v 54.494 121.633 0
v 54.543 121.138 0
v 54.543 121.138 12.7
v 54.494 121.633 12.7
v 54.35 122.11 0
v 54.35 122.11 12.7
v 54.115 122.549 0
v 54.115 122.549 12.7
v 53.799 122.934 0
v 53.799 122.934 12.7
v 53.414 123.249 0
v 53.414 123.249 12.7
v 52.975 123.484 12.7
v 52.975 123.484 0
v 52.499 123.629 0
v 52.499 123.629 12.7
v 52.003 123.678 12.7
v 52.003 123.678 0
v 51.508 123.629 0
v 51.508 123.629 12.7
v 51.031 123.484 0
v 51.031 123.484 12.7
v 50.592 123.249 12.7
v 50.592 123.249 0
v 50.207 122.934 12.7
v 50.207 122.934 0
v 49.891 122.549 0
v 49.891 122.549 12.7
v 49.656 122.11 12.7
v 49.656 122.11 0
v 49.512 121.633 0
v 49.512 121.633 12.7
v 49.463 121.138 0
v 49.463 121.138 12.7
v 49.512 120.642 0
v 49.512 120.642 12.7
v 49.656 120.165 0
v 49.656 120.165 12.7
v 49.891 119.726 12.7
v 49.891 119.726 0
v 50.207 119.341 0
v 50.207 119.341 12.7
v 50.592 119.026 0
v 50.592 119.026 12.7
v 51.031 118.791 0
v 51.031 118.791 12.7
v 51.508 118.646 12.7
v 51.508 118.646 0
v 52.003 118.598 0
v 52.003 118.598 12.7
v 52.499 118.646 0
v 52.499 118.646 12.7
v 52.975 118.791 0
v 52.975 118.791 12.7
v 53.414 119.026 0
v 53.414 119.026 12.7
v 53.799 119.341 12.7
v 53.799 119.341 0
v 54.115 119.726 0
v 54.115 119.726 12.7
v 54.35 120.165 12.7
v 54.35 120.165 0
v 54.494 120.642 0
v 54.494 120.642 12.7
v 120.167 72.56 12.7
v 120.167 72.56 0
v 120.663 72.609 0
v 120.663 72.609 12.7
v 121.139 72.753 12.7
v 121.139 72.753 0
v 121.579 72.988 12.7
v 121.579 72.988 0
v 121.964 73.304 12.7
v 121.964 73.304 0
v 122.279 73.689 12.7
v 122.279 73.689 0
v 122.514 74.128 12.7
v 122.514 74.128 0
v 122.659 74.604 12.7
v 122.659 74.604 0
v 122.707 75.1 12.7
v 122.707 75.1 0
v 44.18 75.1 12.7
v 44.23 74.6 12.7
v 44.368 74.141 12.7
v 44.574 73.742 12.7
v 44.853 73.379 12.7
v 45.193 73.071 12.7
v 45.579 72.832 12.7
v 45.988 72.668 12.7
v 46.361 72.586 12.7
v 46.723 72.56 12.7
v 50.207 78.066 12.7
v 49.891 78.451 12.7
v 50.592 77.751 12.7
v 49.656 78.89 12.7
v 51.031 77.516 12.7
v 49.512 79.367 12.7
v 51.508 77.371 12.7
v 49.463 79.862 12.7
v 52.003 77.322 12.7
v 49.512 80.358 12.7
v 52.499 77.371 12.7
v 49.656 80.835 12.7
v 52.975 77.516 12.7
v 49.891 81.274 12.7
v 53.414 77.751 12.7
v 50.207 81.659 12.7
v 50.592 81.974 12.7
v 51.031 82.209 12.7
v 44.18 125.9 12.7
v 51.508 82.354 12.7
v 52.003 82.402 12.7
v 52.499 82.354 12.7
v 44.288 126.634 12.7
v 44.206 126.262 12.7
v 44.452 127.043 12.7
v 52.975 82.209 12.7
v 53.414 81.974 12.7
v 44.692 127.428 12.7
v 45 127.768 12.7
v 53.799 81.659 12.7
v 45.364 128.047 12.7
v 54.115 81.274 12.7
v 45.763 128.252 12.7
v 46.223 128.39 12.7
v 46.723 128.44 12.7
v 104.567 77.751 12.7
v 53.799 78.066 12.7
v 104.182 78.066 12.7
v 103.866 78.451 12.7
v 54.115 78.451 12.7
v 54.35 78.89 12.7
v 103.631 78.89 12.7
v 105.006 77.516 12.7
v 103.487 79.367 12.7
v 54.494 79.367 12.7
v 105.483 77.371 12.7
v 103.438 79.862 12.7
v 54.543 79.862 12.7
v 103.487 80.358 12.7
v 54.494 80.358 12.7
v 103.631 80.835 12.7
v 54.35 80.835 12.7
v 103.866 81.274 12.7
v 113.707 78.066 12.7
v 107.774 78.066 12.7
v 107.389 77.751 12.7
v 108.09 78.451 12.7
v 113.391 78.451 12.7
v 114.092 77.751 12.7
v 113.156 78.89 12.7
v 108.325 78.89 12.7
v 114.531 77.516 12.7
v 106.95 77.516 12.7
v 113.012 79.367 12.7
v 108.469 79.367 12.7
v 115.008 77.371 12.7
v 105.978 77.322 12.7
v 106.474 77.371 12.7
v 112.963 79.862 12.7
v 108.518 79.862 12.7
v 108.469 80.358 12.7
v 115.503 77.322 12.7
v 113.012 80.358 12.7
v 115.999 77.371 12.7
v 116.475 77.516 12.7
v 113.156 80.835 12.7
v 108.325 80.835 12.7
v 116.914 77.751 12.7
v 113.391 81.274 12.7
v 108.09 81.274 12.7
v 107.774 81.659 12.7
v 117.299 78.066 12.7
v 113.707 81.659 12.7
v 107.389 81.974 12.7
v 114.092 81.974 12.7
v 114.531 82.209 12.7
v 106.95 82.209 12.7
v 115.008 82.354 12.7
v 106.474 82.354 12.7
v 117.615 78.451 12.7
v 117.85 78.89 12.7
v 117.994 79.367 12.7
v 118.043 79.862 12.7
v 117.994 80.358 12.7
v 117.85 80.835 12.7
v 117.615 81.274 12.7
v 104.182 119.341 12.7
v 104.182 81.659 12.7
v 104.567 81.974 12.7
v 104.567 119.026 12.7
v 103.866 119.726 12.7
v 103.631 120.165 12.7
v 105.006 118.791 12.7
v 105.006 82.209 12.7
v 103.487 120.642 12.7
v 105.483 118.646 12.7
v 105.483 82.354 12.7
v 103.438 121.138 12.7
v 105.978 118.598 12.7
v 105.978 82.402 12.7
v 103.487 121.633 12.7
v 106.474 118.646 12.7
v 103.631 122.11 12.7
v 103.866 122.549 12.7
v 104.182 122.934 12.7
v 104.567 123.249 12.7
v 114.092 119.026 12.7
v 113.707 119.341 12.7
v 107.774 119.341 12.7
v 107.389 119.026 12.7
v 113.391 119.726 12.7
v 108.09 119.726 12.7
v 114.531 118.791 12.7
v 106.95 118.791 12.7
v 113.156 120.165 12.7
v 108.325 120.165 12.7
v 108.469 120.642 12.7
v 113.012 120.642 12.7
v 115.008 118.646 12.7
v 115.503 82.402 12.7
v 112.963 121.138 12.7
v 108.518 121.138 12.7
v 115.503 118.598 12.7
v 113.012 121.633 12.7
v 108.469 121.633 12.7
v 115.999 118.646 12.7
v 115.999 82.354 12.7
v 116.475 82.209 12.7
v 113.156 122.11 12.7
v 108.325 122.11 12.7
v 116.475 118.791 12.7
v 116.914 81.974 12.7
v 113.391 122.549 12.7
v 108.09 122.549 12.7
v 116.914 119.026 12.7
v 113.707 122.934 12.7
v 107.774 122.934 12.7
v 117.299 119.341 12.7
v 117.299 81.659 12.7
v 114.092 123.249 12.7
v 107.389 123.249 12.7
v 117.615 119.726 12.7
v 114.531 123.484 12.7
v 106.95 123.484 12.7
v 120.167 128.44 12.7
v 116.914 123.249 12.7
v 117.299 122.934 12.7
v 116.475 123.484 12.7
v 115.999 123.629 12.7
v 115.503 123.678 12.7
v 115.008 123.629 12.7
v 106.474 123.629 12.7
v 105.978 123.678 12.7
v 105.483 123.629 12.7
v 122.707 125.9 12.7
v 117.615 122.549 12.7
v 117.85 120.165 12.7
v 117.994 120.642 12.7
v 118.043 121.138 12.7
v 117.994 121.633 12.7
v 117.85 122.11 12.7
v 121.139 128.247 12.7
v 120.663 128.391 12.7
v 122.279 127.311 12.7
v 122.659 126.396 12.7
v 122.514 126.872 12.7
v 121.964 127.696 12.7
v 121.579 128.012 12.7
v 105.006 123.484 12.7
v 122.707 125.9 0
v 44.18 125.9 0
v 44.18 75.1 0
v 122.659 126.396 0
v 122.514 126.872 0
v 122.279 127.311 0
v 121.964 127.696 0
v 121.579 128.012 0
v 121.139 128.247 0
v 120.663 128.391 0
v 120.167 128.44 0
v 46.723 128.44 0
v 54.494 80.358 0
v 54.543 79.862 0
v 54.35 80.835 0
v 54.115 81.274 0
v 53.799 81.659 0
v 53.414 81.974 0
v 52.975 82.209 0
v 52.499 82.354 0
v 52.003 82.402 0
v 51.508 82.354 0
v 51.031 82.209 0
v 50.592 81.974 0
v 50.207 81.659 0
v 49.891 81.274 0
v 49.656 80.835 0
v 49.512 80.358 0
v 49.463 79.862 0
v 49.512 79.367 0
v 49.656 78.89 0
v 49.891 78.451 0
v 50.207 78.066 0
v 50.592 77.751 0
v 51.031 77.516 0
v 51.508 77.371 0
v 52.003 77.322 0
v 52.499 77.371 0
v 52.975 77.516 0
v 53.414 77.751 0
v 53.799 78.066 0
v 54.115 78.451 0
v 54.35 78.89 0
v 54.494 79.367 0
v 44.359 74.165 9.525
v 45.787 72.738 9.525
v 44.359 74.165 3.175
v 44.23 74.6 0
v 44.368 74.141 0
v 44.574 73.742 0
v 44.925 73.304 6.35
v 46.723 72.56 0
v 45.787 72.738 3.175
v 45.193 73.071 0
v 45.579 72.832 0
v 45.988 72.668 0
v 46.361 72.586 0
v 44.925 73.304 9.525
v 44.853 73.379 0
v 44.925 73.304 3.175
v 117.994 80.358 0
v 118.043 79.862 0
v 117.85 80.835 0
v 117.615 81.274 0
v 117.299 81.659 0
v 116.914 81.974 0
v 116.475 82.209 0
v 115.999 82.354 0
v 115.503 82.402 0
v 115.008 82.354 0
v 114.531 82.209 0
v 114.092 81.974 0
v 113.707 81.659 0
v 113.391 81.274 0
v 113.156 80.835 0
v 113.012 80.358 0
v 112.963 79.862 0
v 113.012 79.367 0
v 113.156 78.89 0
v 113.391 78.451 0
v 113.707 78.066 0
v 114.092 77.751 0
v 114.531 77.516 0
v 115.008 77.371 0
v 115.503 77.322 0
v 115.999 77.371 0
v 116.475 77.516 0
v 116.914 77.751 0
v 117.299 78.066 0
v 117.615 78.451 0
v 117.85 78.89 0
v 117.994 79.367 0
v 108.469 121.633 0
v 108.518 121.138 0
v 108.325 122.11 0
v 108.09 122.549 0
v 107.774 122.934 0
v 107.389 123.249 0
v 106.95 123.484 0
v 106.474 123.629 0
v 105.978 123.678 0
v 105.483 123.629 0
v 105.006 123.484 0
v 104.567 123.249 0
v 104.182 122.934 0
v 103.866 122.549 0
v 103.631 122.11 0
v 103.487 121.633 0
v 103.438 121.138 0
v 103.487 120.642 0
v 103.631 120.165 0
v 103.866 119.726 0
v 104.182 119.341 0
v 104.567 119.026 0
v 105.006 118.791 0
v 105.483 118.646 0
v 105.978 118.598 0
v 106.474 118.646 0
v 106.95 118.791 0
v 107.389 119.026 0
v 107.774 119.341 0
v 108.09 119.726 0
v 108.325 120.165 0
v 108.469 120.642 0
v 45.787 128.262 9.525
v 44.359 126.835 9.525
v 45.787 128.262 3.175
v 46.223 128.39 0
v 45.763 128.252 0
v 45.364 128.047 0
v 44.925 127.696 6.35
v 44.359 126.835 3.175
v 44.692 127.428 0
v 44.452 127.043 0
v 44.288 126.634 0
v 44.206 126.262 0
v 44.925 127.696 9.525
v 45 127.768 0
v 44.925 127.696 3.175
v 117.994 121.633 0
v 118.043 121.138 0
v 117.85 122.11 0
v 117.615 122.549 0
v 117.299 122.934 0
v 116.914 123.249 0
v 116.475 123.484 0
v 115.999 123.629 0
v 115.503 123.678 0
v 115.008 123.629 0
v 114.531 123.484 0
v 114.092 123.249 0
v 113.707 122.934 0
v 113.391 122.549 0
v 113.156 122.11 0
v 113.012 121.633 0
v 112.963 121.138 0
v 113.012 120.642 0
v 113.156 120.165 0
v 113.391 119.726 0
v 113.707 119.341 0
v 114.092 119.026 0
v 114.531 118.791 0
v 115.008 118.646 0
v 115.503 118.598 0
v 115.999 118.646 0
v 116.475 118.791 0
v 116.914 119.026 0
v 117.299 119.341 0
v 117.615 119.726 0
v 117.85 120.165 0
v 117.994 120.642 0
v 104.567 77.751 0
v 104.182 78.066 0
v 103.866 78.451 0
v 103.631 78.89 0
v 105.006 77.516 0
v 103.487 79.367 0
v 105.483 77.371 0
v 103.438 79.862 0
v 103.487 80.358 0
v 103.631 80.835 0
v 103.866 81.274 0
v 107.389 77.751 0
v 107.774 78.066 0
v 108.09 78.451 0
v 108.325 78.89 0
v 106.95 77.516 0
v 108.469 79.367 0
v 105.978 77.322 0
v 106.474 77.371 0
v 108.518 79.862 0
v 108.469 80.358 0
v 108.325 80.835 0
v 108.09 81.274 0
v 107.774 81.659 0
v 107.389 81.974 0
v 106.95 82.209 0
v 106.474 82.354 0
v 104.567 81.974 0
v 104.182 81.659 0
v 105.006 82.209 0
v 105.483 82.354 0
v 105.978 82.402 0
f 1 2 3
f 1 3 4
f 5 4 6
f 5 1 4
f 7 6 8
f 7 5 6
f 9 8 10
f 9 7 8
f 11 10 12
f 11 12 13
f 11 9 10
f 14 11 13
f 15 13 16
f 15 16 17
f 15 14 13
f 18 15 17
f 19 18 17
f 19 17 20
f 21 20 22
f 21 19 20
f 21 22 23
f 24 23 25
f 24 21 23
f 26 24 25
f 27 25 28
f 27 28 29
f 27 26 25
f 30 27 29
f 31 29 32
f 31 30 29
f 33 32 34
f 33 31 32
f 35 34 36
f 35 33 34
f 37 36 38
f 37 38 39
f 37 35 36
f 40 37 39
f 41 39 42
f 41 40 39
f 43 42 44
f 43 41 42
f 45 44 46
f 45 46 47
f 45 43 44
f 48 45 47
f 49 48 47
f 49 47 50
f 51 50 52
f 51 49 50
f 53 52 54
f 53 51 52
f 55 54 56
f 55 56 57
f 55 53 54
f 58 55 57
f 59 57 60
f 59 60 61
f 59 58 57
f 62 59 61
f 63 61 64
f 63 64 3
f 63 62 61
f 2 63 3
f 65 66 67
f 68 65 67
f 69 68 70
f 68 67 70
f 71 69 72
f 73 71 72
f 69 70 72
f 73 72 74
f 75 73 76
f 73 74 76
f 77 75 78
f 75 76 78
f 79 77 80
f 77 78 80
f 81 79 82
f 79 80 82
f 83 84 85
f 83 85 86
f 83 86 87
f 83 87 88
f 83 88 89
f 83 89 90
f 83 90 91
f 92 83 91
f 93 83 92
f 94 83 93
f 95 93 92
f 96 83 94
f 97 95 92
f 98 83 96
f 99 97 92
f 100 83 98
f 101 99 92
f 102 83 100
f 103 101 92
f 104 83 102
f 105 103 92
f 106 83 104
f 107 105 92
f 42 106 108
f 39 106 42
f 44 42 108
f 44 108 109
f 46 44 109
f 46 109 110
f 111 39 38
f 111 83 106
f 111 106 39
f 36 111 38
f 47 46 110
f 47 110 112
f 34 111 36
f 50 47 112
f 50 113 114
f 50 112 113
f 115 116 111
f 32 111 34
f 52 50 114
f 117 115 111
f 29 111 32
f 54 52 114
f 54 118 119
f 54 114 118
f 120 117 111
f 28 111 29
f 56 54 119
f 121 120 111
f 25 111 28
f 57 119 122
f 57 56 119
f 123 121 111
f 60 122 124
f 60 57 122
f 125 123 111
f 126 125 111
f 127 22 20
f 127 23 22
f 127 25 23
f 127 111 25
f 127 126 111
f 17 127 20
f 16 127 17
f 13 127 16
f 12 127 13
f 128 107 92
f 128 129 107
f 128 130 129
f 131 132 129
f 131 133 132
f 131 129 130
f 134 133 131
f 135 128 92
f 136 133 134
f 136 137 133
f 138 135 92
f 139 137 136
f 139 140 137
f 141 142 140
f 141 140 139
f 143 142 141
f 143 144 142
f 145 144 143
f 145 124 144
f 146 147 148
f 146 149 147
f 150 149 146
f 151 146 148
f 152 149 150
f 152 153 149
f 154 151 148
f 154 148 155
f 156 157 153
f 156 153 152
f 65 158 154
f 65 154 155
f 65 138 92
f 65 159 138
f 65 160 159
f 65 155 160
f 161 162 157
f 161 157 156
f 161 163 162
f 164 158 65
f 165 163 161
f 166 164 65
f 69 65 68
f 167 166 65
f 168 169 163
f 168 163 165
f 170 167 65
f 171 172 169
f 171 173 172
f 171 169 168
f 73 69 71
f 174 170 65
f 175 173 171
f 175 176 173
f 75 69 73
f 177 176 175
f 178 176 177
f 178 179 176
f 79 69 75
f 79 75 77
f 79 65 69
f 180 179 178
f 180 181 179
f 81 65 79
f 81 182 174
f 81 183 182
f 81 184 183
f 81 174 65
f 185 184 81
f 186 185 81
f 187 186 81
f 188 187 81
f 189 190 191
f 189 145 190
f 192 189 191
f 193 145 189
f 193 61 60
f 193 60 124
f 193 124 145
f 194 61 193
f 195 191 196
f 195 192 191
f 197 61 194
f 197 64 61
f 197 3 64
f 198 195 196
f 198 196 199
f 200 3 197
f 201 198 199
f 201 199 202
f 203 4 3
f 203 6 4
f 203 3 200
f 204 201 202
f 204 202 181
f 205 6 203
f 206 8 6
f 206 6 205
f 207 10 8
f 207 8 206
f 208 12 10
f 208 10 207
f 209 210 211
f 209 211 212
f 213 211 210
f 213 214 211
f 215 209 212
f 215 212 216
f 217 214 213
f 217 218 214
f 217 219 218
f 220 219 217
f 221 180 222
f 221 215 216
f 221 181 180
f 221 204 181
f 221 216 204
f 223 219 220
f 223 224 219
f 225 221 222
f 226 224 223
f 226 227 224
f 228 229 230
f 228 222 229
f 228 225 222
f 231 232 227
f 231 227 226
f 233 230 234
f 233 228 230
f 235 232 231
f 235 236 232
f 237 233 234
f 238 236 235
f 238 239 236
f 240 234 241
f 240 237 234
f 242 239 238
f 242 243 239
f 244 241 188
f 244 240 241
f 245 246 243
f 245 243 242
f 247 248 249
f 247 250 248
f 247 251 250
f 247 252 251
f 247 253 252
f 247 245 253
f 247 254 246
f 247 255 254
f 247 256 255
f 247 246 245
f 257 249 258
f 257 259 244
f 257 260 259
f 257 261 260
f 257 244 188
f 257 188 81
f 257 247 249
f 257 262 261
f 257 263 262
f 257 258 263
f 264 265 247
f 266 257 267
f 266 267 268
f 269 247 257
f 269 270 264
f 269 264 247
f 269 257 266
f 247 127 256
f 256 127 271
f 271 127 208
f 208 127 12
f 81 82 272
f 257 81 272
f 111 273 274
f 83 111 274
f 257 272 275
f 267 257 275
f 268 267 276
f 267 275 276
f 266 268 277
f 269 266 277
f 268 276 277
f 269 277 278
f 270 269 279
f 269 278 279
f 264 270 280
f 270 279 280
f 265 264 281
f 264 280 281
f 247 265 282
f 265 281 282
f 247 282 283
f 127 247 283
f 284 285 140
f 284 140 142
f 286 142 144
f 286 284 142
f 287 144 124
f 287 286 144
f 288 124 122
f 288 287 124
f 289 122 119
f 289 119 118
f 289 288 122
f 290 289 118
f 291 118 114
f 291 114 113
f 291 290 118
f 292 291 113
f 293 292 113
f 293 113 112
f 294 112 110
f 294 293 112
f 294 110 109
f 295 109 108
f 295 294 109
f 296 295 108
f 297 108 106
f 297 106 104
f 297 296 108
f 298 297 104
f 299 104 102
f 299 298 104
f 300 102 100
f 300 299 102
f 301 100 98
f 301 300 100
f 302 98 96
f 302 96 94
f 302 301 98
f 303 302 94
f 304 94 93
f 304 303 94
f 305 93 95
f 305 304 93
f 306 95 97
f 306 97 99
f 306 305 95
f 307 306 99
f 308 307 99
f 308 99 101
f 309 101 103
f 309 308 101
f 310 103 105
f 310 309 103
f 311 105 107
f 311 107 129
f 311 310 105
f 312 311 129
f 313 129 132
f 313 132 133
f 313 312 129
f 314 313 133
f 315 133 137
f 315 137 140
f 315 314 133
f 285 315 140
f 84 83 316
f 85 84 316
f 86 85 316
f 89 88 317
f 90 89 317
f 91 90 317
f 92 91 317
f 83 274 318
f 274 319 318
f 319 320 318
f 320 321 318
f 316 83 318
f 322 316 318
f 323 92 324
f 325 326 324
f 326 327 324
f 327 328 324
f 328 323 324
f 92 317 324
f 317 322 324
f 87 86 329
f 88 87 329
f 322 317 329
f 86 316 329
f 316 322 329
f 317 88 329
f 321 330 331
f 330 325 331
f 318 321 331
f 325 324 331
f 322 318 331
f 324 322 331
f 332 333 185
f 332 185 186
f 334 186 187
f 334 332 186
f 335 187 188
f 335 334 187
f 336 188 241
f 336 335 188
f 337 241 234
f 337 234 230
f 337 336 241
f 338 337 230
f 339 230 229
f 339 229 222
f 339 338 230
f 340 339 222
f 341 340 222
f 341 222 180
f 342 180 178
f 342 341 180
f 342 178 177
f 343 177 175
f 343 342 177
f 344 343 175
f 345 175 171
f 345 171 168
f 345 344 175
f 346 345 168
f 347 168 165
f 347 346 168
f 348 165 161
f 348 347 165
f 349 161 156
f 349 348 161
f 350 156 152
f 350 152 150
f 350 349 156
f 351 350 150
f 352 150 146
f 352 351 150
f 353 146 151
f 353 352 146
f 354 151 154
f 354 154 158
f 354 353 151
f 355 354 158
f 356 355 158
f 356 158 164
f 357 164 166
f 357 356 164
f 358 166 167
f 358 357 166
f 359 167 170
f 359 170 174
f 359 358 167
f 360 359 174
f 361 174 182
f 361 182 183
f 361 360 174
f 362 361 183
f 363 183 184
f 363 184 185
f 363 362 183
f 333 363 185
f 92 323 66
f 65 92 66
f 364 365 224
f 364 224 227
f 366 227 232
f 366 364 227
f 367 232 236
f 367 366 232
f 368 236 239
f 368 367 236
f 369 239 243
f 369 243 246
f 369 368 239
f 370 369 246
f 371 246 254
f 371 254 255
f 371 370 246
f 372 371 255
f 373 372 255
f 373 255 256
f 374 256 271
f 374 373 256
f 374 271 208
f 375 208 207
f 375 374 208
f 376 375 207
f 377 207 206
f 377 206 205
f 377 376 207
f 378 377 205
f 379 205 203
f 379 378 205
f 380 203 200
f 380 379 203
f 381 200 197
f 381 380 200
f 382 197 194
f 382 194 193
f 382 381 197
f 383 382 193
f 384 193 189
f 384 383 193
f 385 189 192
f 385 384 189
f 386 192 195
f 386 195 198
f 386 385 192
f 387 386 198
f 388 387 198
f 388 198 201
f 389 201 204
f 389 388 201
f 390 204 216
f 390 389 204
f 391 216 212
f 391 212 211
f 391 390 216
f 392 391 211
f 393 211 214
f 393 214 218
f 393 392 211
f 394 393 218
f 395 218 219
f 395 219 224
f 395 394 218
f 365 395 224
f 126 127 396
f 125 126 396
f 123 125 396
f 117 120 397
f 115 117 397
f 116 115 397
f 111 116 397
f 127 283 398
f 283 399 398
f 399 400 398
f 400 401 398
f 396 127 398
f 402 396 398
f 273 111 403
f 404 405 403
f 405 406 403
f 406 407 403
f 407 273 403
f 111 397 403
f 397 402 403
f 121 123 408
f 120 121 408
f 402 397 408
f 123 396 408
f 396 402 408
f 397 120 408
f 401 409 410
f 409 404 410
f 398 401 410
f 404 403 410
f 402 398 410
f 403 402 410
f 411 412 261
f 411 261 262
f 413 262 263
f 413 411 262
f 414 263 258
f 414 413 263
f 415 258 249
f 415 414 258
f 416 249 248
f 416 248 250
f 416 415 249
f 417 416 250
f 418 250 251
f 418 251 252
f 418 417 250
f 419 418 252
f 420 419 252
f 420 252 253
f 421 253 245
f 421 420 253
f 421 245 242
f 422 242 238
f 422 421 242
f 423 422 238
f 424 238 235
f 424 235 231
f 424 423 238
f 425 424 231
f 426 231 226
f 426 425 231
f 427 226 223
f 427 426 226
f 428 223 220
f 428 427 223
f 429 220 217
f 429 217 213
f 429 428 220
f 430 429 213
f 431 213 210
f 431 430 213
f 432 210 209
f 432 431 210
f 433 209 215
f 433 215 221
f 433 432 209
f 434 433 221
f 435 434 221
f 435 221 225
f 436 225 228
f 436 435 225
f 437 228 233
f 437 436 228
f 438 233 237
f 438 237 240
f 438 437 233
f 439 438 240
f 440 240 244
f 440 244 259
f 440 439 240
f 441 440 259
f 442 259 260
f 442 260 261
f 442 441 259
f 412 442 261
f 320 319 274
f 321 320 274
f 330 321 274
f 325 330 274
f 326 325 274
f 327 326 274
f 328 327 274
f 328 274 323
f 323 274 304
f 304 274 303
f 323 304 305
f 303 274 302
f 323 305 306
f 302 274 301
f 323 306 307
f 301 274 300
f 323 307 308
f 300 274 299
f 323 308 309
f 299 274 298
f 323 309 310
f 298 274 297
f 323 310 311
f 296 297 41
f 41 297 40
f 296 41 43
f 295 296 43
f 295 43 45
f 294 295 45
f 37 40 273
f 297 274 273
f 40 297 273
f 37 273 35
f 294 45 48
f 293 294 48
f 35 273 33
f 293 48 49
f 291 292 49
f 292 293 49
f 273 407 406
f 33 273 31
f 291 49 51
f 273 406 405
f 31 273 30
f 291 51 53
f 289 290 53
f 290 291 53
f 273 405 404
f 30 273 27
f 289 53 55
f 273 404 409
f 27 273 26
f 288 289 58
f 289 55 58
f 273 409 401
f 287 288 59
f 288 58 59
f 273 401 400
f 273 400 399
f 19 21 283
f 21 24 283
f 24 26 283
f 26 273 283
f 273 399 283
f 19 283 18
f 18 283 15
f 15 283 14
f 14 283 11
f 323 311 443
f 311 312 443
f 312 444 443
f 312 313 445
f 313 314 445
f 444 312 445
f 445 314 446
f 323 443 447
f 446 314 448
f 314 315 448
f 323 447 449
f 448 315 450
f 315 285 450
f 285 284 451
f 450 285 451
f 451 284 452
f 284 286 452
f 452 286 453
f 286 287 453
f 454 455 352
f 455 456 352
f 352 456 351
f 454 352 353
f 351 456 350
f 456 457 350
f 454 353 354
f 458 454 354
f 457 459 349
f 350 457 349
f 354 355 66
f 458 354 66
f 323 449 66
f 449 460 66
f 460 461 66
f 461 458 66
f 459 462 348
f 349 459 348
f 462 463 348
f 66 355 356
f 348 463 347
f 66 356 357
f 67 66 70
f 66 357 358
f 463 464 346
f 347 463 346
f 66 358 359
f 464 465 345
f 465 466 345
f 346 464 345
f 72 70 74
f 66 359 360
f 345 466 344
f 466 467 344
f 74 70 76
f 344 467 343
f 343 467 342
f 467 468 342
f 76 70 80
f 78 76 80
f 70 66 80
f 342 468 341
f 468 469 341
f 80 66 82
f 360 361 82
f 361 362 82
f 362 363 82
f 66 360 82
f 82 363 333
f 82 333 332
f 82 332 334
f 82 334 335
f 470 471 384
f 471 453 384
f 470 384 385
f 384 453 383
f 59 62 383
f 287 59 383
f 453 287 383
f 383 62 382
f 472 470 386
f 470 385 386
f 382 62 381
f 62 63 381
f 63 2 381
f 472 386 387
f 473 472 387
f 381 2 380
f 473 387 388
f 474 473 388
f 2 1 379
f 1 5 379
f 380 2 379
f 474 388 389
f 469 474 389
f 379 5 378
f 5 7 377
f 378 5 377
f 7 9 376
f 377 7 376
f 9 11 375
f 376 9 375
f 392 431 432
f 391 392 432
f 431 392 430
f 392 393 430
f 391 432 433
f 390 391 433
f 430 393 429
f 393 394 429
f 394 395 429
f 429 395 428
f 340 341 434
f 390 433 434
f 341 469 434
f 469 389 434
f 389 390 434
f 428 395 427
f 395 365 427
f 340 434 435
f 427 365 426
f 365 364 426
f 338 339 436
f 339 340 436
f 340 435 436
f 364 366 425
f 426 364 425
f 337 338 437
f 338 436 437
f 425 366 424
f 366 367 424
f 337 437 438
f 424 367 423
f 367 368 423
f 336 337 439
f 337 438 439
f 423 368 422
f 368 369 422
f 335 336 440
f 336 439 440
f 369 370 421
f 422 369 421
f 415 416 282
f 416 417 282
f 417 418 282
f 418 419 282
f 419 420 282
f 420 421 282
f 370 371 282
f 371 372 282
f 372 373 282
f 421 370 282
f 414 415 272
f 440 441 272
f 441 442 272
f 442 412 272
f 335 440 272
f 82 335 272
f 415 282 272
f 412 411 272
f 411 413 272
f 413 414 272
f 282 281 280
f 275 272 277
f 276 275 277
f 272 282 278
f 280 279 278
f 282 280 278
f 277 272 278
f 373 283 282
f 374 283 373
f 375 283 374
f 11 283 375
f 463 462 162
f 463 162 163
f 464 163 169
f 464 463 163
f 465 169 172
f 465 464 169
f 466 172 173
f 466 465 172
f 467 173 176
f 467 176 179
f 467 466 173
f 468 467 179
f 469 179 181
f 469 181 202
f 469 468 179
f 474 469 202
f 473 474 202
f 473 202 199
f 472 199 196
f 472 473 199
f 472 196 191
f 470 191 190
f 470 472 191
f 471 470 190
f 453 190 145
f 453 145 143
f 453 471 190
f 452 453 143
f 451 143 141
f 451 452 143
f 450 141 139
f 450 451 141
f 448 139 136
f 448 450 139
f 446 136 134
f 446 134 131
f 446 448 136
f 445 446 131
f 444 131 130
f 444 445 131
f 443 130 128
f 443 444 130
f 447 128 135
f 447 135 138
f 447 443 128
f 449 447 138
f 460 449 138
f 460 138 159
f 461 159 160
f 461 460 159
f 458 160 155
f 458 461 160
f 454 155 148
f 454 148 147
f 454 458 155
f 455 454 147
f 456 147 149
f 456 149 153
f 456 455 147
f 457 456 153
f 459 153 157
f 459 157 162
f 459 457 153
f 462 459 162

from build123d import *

# Parameters (mm, degrees)
SKETCH1_R           = 2.54
BOSS_EXTRUDE1_DEPTH = 12.7


with BuildPart() as part:
    # Sketch1 → Boss-Extrude1 (new body)
    with BuildSketch(Plane.XY):
        with BuildLine():
            Line((120.167455723, 128.44), (46.723424496, 128.44))
            add(Edge.make_bspline(
                [(46.723424496, 128.44), (44.179938737, 128.44), (44.179938737, 125.9)],
                knots=[1.570796327, 1.570796327, 1.570796327, 3.141592654, 3.141592654, 3.141592654], degree=2, weights=[1, 0.707106781, 1]))
            Line((44.179938737, 125.9), (44.179938737, 75.1))
            add(Edge.make_bspline(
                [(44.179938737, 75.1), (44.179938737, 72.56), (46.723424496, 72.56)],
                knots=[3.141592654, 3.141592654, 3.141592654, 4.71238898, 4.71238898, 4.71238898], degree=2, weights=[1, 0.707106781, 1]))
            Line((46.723424496, 72.56), (120.167455723, 72.56))
            ThreePointArc((120.167455723, 72.56), (121.963506947, 73.303948776), (122.707455723, 75.1))
            Line((122.707455723, 75.1), (122.707455723, 125.9))
            ThreePointArc((122.707455723, 125.9), (121.963506947, 127.696051224), (120.167455723, 128.44))
        make_face()
        with Locations((105.978138737, 79.8625)):
            Circle(SKETCH1_R, mode=Mode.SUBTRACT)
        with Locations((115.503138737, 79.8625)):
            Circle(SKETCH1_R, mode=Mode.SUBTRACT)
        with Locations((115.503138737, 121.1375)):
            Circle(SKETCH1_R, mode=Mode.SUBTRACT)
        with Locations((105.978138737, 121.1375)):
            Circle(SKETCH1_R, mode=Mode.SUBTRACT)
        with Locations((52.003138737, 121.1375)):
            Circle(SKETCH1_R, mode=Mode.SUBTRACT)
        with Locations((52.003138737, 79.8625)):
            Circle(SKETCH1_R, mode=Mode.SUBTRACT)
    extrude(amount=BOSS_EXTRUDE1_DEPTH)


solid = part.part
